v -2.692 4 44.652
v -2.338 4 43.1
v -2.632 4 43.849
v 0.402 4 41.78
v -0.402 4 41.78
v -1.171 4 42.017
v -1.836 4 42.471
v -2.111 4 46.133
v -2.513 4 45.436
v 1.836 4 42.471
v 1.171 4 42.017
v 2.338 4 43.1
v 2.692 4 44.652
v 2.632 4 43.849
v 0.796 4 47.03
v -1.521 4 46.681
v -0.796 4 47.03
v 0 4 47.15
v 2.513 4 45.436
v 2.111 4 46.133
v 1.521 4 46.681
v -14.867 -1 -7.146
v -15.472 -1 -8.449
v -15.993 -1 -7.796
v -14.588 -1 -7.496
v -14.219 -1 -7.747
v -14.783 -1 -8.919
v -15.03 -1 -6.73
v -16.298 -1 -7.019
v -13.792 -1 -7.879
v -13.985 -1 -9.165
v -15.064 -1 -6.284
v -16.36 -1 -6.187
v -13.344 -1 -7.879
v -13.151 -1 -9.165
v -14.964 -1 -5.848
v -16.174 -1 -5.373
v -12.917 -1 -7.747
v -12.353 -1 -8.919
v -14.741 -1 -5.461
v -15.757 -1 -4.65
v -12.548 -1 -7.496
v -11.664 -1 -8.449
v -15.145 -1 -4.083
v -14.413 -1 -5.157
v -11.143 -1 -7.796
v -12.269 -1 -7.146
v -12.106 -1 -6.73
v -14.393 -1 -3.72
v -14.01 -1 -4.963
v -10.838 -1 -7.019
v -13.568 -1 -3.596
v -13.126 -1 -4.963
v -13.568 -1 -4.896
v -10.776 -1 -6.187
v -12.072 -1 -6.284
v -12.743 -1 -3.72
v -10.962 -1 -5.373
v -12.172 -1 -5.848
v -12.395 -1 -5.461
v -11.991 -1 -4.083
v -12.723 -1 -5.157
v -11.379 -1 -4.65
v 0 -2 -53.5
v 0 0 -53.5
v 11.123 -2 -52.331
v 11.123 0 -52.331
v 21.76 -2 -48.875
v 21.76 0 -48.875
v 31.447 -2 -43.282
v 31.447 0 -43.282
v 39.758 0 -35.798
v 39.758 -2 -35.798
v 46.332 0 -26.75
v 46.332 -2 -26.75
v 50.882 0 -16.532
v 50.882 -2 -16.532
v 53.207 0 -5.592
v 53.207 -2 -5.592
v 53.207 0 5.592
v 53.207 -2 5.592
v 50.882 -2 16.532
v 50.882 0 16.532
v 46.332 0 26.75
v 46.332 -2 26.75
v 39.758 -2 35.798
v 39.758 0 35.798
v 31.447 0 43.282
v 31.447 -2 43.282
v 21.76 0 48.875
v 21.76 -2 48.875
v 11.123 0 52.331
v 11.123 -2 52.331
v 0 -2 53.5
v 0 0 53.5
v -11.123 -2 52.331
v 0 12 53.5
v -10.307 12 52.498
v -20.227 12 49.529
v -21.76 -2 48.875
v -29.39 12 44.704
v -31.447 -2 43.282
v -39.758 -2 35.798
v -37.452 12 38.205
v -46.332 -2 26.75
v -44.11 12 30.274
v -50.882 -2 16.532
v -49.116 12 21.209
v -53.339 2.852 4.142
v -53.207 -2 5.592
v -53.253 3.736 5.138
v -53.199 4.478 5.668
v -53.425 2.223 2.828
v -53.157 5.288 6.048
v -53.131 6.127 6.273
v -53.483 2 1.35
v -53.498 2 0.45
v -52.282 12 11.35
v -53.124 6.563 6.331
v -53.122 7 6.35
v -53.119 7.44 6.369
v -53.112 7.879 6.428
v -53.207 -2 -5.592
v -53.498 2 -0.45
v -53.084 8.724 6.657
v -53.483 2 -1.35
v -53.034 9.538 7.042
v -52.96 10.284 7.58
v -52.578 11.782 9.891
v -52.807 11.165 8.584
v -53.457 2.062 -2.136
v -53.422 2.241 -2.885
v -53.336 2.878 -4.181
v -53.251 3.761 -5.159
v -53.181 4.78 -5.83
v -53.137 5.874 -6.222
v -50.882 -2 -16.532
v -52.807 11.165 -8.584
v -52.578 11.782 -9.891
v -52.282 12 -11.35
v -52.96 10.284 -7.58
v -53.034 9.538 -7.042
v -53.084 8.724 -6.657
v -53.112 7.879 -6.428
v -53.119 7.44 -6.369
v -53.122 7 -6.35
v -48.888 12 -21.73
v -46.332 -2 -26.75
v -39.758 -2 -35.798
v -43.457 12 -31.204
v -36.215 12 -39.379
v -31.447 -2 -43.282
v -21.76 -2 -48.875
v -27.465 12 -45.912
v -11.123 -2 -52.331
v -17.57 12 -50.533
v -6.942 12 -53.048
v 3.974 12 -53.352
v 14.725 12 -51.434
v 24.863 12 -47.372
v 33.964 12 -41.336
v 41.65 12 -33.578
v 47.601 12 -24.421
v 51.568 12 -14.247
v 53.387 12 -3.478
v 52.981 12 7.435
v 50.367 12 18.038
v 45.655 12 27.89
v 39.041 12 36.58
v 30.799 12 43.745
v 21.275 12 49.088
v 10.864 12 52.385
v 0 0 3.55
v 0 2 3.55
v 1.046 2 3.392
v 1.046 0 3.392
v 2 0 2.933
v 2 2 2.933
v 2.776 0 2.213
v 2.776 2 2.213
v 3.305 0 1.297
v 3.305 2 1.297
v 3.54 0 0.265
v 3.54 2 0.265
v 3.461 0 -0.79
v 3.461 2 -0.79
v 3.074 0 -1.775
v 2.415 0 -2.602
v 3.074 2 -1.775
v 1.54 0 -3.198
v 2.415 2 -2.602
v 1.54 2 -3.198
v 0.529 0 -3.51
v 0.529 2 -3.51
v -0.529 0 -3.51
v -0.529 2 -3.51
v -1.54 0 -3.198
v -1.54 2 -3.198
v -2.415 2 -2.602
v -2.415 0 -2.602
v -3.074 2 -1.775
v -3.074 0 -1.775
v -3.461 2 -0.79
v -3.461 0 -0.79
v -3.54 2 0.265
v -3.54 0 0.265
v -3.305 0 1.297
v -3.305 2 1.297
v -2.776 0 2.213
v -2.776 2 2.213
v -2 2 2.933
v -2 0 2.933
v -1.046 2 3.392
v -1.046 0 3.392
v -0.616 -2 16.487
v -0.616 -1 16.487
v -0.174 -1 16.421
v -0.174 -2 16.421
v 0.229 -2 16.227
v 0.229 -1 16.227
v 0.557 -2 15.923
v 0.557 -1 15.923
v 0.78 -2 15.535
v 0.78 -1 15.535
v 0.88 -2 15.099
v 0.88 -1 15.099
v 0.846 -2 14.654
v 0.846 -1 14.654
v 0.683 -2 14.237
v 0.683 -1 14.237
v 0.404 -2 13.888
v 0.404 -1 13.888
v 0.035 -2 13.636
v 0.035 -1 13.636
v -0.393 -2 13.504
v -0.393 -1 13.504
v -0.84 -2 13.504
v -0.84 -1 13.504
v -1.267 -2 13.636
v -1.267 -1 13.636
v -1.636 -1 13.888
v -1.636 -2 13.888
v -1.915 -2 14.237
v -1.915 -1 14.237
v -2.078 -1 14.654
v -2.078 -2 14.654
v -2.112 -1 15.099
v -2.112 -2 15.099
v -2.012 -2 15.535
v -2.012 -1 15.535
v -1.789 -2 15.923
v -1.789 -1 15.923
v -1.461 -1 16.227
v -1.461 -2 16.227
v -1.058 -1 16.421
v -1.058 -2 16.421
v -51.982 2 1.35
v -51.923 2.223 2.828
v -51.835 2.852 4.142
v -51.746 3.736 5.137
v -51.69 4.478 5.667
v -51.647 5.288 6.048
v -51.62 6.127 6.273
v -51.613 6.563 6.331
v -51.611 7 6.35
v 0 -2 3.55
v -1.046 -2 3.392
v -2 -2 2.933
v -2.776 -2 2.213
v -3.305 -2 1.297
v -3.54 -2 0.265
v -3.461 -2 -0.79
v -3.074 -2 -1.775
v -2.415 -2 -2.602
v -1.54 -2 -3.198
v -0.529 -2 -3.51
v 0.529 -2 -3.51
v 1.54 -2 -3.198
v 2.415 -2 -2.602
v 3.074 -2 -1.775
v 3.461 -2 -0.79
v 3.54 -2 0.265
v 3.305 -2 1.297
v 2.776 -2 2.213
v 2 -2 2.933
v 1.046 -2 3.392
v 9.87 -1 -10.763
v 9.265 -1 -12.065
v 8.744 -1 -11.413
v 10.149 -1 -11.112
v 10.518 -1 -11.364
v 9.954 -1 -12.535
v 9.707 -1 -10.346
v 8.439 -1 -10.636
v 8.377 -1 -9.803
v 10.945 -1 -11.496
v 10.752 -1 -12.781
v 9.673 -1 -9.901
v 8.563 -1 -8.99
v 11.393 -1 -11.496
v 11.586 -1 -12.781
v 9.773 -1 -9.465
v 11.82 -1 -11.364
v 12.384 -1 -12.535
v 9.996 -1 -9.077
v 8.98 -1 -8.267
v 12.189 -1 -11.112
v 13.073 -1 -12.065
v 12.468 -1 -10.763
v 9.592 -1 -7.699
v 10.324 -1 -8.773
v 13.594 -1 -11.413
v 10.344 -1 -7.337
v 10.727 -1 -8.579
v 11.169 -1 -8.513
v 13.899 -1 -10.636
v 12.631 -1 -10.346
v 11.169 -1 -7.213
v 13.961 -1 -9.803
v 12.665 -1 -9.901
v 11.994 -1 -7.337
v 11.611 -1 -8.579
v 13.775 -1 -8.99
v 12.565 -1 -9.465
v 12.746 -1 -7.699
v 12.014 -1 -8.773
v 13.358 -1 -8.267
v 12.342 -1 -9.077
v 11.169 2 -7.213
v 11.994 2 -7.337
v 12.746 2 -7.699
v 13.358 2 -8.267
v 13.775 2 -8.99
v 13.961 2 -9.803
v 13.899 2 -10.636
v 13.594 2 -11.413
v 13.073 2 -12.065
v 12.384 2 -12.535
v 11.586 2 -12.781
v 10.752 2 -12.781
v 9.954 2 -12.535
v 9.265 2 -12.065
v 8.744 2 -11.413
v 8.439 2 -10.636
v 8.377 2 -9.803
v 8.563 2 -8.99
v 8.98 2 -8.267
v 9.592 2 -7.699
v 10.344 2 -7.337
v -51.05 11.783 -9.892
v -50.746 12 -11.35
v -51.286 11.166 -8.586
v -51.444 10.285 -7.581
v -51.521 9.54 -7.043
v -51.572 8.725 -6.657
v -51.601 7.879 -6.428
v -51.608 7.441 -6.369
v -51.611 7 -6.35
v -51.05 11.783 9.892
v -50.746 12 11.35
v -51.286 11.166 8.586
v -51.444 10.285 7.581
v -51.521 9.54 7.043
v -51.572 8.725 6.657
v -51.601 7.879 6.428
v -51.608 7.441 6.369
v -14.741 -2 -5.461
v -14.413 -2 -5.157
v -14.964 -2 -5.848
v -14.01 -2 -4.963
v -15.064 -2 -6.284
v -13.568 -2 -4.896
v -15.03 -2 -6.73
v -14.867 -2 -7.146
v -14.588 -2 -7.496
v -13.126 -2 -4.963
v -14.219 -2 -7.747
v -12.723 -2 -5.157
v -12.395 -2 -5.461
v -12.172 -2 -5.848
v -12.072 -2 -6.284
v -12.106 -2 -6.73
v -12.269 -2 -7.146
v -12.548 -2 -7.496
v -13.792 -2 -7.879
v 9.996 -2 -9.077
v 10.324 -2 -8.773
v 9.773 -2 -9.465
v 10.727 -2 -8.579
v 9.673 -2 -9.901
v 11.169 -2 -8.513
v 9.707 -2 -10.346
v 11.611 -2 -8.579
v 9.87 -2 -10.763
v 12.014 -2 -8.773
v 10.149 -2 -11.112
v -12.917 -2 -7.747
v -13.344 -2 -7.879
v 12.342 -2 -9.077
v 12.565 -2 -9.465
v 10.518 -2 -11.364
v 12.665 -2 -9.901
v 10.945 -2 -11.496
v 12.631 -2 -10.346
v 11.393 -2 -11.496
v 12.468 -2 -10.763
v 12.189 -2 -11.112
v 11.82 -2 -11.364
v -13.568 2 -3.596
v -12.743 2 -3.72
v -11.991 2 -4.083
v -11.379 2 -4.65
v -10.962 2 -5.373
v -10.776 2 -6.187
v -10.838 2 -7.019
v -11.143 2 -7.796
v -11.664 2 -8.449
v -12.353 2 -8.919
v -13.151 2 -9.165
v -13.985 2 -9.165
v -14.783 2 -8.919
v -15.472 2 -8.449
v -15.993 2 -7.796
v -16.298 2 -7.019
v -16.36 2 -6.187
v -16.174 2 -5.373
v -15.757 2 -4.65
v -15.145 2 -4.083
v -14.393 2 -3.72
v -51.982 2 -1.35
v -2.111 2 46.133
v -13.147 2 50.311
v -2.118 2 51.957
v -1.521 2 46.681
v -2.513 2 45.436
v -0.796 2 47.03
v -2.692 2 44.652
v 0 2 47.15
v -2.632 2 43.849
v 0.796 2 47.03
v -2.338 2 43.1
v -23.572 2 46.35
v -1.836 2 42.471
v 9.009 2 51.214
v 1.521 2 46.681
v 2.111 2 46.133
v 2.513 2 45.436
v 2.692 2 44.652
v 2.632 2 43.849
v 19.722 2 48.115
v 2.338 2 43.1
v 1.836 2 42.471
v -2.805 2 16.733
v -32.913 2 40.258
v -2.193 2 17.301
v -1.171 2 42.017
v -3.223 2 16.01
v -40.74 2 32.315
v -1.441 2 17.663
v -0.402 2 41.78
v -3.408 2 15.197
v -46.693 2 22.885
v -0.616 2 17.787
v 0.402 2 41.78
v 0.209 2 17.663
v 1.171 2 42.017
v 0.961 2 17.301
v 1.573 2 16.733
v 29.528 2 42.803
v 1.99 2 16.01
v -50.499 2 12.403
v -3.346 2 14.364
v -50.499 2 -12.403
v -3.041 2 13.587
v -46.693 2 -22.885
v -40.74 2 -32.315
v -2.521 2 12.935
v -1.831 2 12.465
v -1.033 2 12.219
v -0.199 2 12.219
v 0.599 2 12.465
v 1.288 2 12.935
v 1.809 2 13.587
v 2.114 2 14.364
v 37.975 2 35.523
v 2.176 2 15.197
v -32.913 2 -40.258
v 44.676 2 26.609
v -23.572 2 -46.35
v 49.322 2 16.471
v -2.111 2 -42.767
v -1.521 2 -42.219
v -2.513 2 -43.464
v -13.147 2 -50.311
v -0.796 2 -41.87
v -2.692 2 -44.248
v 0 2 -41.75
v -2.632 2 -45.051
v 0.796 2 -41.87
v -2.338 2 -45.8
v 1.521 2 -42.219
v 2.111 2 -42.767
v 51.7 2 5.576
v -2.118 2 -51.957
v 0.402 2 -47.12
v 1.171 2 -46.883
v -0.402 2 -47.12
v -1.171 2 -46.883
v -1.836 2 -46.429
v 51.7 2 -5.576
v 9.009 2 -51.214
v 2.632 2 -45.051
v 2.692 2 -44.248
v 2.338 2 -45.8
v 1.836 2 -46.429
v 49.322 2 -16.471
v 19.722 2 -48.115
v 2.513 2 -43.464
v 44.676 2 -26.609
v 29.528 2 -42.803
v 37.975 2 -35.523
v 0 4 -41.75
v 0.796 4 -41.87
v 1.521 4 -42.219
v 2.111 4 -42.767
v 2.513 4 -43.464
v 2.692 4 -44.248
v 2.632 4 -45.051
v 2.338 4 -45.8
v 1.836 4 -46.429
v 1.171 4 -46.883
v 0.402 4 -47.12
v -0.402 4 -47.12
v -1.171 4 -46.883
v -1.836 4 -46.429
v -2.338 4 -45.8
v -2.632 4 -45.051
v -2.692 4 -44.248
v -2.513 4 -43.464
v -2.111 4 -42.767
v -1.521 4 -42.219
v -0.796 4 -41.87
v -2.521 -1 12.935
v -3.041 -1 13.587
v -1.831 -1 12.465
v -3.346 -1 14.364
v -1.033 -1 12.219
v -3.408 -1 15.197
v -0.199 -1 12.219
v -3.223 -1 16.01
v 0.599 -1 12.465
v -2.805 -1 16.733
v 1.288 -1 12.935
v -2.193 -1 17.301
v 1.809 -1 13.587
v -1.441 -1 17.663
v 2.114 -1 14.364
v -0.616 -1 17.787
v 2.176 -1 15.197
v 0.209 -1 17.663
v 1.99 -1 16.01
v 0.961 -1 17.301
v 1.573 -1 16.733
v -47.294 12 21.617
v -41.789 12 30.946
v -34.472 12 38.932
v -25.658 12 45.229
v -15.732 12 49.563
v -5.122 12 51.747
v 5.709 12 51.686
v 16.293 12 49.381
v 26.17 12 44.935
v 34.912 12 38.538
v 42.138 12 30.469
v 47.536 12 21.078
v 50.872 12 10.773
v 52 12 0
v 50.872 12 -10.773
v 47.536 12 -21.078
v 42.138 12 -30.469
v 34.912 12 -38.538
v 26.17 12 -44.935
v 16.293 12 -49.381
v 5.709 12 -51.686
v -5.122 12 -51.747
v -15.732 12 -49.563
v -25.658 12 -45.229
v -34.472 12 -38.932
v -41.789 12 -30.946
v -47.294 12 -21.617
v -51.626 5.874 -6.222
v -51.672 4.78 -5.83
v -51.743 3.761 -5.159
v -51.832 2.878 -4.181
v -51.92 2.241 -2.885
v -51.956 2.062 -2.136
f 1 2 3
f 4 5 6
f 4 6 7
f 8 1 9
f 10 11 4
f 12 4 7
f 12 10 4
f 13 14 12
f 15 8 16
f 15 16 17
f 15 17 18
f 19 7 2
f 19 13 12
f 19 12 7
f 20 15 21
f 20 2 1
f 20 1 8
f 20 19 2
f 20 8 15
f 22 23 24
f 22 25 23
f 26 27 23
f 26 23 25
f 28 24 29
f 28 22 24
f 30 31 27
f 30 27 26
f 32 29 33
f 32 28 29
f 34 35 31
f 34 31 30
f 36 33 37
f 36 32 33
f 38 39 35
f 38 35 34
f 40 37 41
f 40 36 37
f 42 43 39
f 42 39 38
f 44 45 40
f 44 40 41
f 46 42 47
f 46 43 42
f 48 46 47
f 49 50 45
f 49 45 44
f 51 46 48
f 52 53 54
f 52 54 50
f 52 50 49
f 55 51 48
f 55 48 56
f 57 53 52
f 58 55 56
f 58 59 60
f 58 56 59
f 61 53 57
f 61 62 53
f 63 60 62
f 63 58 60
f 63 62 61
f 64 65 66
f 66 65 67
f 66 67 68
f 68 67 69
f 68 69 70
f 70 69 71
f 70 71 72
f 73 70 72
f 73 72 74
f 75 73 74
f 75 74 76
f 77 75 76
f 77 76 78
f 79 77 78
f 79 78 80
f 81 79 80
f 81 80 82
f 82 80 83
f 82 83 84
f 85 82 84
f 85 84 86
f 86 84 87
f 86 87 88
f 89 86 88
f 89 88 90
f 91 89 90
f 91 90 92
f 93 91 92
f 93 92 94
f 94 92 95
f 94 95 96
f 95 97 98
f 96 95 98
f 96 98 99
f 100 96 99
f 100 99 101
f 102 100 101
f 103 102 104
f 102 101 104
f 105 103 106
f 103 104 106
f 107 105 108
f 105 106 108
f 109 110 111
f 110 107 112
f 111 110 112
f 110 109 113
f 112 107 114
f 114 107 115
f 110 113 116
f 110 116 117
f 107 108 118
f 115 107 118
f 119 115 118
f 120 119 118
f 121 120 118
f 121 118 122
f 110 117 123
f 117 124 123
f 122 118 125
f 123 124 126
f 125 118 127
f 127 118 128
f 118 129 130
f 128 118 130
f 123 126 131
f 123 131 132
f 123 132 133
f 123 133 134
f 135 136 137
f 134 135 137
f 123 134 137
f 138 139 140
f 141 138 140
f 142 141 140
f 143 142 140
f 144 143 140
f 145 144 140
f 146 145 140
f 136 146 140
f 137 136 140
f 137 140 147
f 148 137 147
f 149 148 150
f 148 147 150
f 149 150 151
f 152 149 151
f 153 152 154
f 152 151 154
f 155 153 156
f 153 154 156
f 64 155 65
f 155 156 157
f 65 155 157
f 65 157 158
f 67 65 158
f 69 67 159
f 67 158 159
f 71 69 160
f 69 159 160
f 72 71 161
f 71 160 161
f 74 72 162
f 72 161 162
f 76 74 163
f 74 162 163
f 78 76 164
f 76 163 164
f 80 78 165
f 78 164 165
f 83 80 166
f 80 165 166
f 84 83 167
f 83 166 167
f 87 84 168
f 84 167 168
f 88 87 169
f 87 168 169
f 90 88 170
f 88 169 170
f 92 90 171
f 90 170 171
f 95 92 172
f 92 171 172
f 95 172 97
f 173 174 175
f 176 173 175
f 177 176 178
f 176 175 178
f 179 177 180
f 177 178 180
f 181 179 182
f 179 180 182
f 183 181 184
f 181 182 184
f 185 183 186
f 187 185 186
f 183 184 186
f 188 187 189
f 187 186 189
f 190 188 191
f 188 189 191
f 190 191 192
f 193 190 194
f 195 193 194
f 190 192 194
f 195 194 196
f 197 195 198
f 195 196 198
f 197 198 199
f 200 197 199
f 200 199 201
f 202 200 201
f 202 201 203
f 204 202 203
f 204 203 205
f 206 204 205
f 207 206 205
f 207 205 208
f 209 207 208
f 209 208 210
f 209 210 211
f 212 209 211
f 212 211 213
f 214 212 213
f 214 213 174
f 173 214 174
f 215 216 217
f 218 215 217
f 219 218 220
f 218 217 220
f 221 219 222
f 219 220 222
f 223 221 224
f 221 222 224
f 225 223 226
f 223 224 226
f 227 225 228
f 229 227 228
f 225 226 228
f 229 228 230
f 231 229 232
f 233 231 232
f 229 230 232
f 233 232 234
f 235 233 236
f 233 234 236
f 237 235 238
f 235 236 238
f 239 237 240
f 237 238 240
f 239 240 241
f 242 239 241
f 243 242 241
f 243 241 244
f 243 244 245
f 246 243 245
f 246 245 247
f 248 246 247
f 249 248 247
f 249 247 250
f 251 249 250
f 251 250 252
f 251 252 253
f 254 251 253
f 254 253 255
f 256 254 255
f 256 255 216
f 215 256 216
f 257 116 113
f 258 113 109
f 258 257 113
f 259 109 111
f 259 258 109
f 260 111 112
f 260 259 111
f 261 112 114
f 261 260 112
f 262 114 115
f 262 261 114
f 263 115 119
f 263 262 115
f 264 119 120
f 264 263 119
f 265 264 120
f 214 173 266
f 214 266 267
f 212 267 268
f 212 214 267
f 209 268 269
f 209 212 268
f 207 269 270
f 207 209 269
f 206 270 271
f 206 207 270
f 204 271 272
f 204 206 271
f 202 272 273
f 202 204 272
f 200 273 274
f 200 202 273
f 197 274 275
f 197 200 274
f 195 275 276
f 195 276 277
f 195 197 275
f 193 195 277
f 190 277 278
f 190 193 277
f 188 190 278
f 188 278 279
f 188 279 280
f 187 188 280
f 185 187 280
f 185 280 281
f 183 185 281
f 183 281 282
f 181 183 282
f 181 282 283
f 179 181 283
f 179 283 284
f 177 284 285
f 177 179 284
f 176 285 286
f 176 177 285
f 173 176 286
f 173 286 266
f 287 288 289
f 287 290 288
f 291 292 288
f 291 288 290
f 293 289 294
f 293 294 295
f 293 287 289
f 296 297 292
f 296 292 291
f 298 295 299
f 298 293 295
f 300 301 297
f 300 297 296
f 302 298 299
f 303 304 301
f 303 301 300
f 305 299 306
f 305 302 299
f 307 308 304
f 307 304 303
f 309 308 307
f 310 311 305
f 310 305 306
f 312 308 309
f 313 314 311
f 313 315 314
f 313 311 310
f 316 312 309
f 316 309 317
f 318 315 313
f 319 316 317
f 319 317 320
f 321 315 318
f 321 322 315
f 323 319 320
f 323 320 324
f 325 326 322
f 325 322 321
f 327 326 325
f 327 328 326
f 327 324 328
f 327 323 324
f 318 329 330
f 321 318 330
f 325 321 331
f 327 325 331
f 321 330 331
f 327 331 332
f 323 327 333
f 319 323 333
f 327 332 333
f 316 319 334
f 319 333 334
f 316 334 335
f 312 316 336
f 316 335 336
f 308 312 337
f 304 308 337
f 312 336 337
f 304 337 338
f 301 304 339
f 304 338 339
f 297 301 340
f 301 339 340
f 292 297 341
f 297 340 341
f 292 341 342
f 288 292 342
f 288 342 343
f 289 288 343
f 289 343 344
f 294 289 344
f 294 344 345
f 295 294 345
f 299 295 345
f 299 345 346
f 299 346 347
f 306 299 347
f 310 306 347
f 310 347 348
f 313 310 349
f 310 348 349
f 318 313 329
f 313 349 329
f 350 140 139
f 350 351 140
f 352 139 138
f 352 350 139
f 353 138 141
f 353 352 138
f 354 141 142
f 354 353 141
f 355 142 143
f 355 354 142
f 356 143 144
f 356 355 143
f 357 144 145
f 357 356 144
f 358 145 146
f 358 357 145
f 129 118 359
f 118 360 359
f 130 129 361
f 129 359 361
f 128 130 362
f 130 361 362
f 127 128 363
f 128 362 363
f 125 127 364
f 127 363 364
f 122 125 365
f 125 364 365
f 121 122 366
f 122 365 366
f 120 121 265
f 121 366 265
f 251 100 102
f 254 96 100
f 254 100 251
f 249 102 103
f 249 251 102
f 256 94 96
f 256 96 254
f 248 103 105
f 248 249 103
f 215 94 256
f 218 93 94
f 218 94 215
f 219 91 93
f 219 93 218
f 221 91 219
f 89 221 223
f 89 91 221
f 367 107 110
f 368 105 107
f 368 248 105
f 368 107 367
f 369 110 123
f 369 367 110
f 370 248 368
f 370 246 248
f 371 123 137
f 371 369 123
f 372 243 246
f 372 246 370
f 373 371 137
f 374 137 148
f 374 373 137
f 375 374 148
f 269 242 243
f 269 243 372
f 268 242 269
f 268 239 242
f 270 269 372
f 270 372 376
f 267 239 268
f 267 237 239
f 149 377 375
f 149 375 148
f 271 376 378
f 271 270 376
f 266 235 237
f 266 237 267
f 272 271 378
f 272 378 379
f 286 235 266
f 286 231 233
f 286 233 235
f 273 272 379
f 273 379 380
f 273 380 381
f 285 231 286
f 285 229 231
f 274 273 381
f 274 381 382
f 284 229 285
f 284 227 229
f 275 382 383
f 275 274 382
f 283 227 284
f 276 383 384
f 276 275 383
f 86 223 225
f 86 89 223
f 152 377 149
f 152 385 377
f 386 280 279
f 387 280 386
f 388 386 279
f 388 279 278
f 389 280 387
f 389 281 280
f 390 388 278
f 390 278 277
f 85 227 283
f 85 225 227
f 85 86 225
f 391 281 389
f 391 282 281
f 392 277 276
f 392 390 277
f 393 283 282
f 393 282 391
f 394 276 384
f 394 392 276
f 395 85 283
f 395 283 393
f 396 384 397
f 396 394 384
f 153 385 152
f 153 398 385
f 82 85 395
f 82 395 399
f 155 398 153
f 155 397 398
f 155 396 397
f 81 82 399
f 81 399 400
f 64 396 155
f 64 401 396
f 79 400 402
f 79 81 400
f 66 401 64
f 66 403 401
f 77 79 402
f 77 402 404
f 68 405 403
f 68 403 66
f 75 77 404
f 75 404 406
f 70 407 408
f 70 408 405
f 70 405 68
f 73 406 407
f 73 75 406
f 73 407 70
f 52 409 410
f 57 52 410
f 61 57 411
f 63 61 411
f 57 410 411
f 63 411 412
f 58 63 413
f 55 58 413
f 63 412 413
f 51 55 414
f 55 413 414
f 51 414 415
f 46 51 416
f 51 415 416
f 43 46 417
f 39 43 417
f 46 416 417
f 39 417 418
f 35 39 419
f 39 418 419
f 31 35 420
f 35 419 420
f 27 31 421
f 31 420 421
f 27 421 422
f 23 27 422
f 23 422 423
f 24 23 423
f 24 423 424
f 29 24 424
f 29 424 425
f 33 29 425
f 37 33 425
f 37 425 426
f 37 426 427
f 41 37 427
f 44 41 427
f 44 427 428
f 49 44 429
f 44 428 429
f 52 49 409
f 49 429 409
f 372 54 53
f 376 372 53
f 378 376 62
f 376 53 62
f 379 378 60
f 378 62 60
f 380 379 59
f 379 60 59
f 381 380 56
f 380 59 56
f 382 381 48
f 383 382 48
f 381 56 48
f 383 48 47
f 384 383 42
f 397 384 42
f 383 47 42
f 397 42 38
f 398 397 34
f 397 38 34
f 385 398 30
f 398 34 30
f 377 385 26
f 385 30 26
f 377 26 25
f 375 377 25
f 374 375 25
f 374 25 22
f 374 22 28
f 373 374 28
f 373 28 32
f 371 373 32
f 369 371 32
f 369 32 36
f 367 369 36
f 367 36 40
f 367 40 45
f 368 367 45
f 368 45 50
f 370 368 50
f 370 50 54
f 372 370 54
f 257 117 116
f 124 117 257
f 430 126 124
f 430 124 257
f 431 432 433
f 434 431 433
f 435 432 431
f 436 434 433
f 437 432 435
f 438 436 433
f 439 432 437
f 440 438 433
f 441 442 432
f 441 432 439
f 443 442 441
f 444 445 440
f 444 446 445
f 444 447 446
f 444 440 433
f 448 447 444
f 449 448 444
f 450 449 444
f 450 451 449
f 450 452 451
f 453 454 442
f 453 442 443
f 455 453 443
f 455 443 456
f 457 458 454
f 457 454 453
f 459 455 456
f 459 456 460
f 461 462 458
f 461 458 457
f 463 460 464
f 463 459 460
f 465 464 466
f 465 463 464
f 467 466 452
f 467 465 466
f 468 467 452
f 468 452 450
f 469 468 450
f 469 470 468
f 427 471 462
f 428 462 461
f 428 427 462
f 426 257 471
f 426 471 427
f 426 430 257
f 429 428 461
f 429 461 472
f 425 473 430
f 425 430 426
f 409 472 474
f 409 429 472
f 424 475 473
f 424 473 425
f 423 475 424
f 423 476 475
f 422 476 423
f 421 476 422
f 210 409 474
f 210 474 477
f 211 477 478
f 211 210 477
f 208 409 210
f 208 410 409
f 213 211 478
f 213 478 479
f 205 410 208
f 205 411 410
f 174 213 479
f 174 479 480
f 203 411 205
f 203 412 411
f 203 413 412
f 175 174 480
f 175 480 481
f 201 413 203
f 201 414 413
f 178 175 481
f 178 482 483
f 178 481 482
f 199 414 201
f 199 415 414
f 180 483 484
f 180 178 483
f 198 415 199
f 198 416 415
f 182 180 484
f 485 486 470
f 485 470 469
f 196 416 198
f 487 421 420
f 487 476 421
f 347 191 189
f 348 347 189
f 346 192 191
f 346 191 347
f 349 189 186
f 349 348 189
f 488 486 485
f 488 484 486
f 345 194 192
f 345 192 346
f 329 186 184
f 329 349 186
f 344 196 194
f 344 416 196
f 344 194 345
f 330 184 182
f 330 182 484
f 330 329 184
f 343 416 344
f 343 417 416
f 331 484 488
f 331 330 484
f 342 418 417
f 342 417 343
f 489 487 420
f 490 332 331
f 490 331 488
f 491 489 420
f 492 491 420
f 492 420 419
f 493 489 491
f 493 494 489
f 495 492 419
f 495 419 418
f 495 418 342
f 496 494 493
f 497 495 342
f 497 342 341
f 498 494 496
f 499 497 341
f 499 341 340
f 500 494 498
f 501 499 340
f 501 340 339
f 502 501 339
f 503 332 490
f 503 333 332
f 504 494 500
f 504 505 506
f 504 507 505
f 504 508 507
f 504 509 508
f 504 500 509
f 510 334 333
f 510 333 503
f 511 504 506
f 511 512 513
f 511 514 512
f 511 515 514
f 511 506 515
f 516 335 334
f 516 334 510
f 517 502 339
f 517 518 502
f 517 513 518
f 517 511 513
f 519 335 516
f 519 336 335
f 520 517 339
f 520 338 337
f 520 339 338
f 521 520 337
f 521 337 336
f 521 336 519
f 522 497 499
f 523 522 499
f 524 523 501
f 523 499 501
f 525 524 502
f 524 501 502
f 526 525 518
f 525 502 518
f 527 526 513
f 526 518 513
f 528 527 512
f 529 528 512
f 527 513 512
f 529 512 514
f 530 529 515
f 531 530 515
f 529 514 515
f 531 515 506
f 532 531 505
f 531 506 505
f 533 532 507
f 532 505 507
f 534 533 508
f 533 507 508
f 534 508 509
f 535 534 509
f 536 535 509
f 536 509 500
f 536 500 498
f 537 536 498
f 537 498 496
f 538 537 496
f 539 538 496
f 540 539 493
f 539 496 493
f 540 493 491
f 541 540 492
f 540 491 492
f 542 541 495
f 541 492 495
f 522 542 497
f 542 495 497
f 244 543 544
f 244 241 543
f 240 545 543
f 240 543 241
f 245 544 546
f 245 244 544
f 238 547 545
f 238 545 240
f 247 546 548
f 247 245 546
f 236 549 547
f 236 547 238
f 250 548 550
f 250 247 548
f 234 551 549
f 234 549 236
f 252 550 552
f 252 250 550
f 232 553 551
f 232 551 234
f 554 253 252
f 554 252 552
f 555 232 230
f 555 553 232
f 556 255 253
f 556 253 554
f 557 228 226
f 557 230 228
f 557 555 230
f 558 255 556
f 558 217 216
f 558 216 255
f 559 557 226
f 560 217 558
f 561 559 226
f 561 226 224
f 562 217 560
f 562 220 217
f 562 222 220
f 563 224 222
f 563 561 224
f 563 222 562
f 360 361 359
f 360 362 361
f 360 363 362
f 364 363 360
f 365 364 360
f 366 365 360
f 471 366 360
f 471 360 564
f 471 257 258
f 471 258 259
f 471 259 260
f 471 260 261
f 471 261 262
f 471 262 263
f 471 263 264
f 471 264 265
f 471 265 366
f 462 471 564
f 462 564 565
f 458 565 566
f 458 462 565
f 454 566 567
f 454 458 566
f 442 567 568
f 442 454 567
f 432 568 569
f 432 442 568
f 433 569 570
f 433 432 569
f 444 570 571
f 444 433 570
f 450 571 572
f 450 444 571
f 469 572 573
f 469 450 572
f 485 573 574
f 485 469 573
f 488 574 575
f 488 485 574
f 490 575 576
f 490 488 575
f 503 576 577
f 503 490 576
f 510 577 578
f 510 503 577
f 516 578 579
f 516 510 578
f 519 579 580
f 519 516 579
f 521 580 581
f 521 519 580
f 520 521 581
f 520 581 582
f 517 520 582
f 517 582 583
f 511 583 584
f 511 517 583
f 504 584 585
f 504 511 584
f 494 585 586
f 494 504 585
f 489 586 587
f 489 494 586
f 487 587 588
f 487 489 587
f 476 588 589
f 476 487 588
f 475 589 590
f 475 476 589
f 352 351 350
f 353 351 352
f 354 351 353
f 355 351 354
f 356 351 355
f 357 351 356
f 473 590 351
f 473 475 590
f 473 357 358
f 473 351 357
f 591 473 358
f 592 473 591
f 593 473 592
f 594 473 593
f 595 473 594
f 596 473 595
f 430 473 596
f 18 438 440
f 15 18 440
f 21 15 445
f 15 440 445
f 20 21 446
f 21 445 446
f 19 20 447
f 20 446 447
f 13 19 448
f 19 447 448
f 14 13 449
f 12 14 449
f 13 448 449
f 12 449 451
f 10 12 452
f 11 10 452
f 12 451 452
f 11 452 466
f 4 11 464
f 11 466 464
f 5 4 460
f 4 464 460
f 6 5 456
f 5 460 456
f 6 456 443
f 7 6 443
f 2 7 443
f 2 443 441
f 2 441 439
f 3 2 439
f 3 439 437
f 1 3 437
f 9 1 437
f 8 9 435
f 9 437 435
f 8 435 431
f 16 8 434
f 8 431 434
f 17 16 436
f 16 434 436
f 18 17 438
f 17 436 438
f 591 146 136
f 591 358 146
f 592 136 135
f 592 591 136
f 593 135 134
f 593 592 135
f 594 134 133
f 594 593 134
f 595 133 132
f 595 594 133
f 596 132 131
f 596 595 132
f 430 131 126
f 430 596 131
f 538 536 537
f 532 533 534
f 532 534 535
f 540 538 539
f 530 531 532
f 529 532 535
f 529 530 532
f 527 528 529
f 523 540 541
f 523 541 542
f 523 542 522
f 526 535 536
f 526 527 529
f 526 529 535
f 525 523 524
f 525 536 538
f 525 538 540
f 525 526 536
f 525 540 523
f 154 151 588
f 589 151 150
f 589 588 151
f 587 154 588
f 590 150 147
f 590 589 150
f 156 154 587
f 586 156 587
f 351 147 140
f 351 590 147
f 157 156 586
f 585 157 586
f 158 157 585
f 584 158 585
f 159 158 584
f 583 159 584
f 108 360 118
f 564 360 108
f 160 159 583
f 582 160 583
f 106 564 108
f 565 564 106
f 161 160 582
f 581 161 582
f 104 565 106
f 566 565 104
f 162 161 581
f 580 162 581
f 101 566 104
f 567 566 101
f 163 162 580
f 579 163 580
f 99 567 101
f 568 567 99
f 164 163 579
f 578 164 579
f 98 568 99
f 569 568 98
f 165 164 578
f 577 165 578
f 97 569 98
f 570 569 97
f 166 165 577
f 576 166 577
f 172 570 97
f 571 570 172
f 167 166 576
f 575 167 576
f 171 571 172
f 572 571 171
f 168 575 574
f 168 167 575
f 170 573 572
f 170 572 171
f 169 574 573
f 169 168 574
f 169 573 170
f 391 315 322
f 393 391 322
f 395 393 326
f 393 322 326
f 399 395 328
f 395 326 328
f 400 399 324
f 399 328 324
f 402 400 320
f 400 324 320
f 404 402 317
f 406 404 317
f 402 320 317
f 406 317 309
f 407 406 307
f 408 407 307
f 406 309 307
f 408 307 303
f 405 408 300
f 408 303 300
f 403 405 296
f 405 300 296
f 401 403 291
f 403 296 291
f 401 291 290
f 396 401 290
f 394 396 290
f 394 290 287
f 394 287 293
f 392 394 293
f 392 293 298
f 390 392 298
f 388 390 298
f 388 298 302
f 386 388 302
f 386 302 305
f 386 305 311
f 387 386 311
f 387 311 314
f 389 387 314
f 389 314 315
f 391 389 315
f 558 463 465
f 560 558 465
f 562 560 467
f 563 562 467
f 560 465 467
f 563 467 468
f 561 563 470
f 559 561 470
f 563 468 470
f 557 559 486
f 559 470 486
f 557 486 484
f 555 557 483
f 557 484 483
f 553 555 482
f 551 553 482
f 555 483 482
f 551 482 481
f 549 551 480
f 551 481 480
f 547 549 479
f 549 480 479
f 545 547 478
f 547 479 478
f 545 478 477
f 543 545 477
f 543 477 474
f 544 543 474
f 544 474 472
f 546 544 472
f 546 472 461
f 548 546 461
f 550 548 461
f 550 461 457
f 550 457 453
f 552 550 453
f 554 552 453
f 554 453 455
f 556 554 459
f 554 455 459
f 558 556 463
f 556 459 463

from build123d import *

# Parameters (mm, degrees)
SKETCH1_R           = 53.5
BOSS_EXTRUDE1_DEPTH = 2
SKETCH2_R           = 2.7
BOSS_EXTRUDE2_DEPTH = 2
SKETCH3_R           = 3.55
CUT_EXTRUDE1_DEPTH  = 2
SKETCH7_R           = 53.5
SKETCH7_R_2         = 52
BOSS_EXTRUDE3_DEPTH = 10
SKETCH8_W           = 56.651812746
SKETCH8_H           = 12.7
CUT_EXTRUDE4_DEPTH  = 10
SKETCH13_R          = 53.5
SKETCH13_R_2        = 3.55
BOSS_EXTRUDE4_DEPTH = 2
SKETCH12_R          = 2.8
CUT_EXTRUDE6_DEPTH  = 3
SKETCH16_R          = 1.5
CUT_EXTRUDE8_DEPTH  = 77.769134423
FILLET3_R           = 5


with BuildPart() as part:
    # Sketch1 → Boss-Extrude1 (new body)
    with BuildSketch(Plane(origin=(0, 0, 0), x_dir=(1, 0, 0), z_dir=(0, 1, 0))):
        with Locations(Location((0, 0, 0), (0, 0, 270))):
            Circle(SKETCH1_R)
    extrude(amount=BOSS_EXTRUDE1_DEPTH)

    # Sketch2 → Boss-Extrude2 (add)
    with BuildSketch(Plane(origin=(0, 2, 0), x_dir=(1, 0, 0), z_dir=(0, 1, 0))):
        with Locations(Location((0, -44.45, 0), (0, 0, 270))):
            Circle(SKETCH2_R)
        with Locations(Location((0, 44.45, 0), (0, 0, 270))):
            Circle(SKETCH2_R)
    extrude(amount=BOSS_EXTRUDE2_DEPTH)

    # Sketch3 → Cut-Extrude1 (cut)
    with BuildSketch(Plane(origin=(0, 2, 0), x_dir=(1, 0, 0), z_dir=(0, 1, 0))):
        with Locations(Location((0, 0, 0), (0, 0, 270))):
            Circle(SKETCH3_R)
    extrude(amount=-CUT_EXTRUDE1_DEPTH, mode=Mode.SUBTRACT)

    # Sketch7 → Boss-Extrude3 (add)
    with BuildSketch(Plane(origin=(0, 2, 0), x_dir=(1, 0, 0), z_dir=(0, 1, 0))):
        with Locations(Location((0, 0, 0), (0, 0, 270))):
            Circle(SKETCH7_R)
        with Locations(Location((0, 0, 0), (0, 0, 270))):
            Circle(SKETCH7_R_2, mode=Mode.SUBTRACT)
    extrude(amount=BOSS_EXTRUDE3_DEPTH)

    # Sketch8 → Cut-Extrude4 (cut)
    with BuildSketch(Plane(origin=(0, 2, 0), x_dir=(1, 0, 0), z_dir=(0, 1, 0))):
        with Locations((-28.325906373, 0)):
            Rectangle(SKETCH8_W, SKETCH8_H)
    extrude(amount=CUT_EXTRUDE4_DEPTH, mode=Mode.SUBTRACT)

    # Sketch13 → Boss-Extrude4 (add)
    with BuildSketch(Plane.XZ):
        with Locations(Location((0, 0, 0), (0, 0, 270))):
            Circle(SKETCH13_R)
        with Locations(Location((0, 0, 0), (0, 0, 90))):
            Circle(SKETCH13_R_2, mode=Mode.SUBTRACT)
    extrude(amount=BOSS_EXTRUDE4_DEPTH)

    # Sketch12 → Cut-Extrude6 (cut)
    with BuildSketch(Plane(origin=(0, 2, 0), x_dir=(1, 0, 0), z_dir=(0, 1, 0))):
        with Locations(Location((11.16900504, 10.012658309, 0), (0, 0, 270))):
            Circle(SKETCH12_R)
        with Locations(Location((-0.61610798, -14.987341691, 0), (0, 0, 270))):
            Circle(SKETCH12_R)
        with Locations(Location((-13.568010506, 6.396021491, 0), (0, 0, 270))):
            Circle(SKETCH12_R)
    extrude(amount=-CUT_EXTRUDE6_DEPTH, mode=Mode.SUBTRACT)

    # Sketch16 → Cut-Extrude8 (cut, through all)
    with BuildSketch(Plane(origin=(0, -1, 0), x_dir=(1, 0, 0), z_dir=(0, 1, 0))):
        with Locations(Location((11.16900504, 10.012658309, 0), (0, 0, 270))):
            Circle(SKETCH16_R)
        with Locations(Location((-0.61610798, -14.987341691, 0), (0, 0, 270))):
            Circle(SKETCH16_R)
        with Locations(Location((-13.568010506, 6.396021491, 0), (0, 0, 270))):
            Circle(SKETCH16_R)
    extrude(amount=-CUT_EXTRUDE8_DEPTH, mode=Mode.SUBTRACT)

    # Fillet3
    fillet3_edges = [part.edges().sort_by_distance(p)[0] for p in [
        (-52.366322452, 12, -6.35),
        (-52.366322452, 12, 6.35),
        (-52.366322452, 2, 6.35),
        (-52.366322452, 2, -6.35),
    ]]
    fillet(fillet3_edges, radius=FILLET3_R - 0.0001)  # a hair under: the kernel refuses the full size


solid = part.part
